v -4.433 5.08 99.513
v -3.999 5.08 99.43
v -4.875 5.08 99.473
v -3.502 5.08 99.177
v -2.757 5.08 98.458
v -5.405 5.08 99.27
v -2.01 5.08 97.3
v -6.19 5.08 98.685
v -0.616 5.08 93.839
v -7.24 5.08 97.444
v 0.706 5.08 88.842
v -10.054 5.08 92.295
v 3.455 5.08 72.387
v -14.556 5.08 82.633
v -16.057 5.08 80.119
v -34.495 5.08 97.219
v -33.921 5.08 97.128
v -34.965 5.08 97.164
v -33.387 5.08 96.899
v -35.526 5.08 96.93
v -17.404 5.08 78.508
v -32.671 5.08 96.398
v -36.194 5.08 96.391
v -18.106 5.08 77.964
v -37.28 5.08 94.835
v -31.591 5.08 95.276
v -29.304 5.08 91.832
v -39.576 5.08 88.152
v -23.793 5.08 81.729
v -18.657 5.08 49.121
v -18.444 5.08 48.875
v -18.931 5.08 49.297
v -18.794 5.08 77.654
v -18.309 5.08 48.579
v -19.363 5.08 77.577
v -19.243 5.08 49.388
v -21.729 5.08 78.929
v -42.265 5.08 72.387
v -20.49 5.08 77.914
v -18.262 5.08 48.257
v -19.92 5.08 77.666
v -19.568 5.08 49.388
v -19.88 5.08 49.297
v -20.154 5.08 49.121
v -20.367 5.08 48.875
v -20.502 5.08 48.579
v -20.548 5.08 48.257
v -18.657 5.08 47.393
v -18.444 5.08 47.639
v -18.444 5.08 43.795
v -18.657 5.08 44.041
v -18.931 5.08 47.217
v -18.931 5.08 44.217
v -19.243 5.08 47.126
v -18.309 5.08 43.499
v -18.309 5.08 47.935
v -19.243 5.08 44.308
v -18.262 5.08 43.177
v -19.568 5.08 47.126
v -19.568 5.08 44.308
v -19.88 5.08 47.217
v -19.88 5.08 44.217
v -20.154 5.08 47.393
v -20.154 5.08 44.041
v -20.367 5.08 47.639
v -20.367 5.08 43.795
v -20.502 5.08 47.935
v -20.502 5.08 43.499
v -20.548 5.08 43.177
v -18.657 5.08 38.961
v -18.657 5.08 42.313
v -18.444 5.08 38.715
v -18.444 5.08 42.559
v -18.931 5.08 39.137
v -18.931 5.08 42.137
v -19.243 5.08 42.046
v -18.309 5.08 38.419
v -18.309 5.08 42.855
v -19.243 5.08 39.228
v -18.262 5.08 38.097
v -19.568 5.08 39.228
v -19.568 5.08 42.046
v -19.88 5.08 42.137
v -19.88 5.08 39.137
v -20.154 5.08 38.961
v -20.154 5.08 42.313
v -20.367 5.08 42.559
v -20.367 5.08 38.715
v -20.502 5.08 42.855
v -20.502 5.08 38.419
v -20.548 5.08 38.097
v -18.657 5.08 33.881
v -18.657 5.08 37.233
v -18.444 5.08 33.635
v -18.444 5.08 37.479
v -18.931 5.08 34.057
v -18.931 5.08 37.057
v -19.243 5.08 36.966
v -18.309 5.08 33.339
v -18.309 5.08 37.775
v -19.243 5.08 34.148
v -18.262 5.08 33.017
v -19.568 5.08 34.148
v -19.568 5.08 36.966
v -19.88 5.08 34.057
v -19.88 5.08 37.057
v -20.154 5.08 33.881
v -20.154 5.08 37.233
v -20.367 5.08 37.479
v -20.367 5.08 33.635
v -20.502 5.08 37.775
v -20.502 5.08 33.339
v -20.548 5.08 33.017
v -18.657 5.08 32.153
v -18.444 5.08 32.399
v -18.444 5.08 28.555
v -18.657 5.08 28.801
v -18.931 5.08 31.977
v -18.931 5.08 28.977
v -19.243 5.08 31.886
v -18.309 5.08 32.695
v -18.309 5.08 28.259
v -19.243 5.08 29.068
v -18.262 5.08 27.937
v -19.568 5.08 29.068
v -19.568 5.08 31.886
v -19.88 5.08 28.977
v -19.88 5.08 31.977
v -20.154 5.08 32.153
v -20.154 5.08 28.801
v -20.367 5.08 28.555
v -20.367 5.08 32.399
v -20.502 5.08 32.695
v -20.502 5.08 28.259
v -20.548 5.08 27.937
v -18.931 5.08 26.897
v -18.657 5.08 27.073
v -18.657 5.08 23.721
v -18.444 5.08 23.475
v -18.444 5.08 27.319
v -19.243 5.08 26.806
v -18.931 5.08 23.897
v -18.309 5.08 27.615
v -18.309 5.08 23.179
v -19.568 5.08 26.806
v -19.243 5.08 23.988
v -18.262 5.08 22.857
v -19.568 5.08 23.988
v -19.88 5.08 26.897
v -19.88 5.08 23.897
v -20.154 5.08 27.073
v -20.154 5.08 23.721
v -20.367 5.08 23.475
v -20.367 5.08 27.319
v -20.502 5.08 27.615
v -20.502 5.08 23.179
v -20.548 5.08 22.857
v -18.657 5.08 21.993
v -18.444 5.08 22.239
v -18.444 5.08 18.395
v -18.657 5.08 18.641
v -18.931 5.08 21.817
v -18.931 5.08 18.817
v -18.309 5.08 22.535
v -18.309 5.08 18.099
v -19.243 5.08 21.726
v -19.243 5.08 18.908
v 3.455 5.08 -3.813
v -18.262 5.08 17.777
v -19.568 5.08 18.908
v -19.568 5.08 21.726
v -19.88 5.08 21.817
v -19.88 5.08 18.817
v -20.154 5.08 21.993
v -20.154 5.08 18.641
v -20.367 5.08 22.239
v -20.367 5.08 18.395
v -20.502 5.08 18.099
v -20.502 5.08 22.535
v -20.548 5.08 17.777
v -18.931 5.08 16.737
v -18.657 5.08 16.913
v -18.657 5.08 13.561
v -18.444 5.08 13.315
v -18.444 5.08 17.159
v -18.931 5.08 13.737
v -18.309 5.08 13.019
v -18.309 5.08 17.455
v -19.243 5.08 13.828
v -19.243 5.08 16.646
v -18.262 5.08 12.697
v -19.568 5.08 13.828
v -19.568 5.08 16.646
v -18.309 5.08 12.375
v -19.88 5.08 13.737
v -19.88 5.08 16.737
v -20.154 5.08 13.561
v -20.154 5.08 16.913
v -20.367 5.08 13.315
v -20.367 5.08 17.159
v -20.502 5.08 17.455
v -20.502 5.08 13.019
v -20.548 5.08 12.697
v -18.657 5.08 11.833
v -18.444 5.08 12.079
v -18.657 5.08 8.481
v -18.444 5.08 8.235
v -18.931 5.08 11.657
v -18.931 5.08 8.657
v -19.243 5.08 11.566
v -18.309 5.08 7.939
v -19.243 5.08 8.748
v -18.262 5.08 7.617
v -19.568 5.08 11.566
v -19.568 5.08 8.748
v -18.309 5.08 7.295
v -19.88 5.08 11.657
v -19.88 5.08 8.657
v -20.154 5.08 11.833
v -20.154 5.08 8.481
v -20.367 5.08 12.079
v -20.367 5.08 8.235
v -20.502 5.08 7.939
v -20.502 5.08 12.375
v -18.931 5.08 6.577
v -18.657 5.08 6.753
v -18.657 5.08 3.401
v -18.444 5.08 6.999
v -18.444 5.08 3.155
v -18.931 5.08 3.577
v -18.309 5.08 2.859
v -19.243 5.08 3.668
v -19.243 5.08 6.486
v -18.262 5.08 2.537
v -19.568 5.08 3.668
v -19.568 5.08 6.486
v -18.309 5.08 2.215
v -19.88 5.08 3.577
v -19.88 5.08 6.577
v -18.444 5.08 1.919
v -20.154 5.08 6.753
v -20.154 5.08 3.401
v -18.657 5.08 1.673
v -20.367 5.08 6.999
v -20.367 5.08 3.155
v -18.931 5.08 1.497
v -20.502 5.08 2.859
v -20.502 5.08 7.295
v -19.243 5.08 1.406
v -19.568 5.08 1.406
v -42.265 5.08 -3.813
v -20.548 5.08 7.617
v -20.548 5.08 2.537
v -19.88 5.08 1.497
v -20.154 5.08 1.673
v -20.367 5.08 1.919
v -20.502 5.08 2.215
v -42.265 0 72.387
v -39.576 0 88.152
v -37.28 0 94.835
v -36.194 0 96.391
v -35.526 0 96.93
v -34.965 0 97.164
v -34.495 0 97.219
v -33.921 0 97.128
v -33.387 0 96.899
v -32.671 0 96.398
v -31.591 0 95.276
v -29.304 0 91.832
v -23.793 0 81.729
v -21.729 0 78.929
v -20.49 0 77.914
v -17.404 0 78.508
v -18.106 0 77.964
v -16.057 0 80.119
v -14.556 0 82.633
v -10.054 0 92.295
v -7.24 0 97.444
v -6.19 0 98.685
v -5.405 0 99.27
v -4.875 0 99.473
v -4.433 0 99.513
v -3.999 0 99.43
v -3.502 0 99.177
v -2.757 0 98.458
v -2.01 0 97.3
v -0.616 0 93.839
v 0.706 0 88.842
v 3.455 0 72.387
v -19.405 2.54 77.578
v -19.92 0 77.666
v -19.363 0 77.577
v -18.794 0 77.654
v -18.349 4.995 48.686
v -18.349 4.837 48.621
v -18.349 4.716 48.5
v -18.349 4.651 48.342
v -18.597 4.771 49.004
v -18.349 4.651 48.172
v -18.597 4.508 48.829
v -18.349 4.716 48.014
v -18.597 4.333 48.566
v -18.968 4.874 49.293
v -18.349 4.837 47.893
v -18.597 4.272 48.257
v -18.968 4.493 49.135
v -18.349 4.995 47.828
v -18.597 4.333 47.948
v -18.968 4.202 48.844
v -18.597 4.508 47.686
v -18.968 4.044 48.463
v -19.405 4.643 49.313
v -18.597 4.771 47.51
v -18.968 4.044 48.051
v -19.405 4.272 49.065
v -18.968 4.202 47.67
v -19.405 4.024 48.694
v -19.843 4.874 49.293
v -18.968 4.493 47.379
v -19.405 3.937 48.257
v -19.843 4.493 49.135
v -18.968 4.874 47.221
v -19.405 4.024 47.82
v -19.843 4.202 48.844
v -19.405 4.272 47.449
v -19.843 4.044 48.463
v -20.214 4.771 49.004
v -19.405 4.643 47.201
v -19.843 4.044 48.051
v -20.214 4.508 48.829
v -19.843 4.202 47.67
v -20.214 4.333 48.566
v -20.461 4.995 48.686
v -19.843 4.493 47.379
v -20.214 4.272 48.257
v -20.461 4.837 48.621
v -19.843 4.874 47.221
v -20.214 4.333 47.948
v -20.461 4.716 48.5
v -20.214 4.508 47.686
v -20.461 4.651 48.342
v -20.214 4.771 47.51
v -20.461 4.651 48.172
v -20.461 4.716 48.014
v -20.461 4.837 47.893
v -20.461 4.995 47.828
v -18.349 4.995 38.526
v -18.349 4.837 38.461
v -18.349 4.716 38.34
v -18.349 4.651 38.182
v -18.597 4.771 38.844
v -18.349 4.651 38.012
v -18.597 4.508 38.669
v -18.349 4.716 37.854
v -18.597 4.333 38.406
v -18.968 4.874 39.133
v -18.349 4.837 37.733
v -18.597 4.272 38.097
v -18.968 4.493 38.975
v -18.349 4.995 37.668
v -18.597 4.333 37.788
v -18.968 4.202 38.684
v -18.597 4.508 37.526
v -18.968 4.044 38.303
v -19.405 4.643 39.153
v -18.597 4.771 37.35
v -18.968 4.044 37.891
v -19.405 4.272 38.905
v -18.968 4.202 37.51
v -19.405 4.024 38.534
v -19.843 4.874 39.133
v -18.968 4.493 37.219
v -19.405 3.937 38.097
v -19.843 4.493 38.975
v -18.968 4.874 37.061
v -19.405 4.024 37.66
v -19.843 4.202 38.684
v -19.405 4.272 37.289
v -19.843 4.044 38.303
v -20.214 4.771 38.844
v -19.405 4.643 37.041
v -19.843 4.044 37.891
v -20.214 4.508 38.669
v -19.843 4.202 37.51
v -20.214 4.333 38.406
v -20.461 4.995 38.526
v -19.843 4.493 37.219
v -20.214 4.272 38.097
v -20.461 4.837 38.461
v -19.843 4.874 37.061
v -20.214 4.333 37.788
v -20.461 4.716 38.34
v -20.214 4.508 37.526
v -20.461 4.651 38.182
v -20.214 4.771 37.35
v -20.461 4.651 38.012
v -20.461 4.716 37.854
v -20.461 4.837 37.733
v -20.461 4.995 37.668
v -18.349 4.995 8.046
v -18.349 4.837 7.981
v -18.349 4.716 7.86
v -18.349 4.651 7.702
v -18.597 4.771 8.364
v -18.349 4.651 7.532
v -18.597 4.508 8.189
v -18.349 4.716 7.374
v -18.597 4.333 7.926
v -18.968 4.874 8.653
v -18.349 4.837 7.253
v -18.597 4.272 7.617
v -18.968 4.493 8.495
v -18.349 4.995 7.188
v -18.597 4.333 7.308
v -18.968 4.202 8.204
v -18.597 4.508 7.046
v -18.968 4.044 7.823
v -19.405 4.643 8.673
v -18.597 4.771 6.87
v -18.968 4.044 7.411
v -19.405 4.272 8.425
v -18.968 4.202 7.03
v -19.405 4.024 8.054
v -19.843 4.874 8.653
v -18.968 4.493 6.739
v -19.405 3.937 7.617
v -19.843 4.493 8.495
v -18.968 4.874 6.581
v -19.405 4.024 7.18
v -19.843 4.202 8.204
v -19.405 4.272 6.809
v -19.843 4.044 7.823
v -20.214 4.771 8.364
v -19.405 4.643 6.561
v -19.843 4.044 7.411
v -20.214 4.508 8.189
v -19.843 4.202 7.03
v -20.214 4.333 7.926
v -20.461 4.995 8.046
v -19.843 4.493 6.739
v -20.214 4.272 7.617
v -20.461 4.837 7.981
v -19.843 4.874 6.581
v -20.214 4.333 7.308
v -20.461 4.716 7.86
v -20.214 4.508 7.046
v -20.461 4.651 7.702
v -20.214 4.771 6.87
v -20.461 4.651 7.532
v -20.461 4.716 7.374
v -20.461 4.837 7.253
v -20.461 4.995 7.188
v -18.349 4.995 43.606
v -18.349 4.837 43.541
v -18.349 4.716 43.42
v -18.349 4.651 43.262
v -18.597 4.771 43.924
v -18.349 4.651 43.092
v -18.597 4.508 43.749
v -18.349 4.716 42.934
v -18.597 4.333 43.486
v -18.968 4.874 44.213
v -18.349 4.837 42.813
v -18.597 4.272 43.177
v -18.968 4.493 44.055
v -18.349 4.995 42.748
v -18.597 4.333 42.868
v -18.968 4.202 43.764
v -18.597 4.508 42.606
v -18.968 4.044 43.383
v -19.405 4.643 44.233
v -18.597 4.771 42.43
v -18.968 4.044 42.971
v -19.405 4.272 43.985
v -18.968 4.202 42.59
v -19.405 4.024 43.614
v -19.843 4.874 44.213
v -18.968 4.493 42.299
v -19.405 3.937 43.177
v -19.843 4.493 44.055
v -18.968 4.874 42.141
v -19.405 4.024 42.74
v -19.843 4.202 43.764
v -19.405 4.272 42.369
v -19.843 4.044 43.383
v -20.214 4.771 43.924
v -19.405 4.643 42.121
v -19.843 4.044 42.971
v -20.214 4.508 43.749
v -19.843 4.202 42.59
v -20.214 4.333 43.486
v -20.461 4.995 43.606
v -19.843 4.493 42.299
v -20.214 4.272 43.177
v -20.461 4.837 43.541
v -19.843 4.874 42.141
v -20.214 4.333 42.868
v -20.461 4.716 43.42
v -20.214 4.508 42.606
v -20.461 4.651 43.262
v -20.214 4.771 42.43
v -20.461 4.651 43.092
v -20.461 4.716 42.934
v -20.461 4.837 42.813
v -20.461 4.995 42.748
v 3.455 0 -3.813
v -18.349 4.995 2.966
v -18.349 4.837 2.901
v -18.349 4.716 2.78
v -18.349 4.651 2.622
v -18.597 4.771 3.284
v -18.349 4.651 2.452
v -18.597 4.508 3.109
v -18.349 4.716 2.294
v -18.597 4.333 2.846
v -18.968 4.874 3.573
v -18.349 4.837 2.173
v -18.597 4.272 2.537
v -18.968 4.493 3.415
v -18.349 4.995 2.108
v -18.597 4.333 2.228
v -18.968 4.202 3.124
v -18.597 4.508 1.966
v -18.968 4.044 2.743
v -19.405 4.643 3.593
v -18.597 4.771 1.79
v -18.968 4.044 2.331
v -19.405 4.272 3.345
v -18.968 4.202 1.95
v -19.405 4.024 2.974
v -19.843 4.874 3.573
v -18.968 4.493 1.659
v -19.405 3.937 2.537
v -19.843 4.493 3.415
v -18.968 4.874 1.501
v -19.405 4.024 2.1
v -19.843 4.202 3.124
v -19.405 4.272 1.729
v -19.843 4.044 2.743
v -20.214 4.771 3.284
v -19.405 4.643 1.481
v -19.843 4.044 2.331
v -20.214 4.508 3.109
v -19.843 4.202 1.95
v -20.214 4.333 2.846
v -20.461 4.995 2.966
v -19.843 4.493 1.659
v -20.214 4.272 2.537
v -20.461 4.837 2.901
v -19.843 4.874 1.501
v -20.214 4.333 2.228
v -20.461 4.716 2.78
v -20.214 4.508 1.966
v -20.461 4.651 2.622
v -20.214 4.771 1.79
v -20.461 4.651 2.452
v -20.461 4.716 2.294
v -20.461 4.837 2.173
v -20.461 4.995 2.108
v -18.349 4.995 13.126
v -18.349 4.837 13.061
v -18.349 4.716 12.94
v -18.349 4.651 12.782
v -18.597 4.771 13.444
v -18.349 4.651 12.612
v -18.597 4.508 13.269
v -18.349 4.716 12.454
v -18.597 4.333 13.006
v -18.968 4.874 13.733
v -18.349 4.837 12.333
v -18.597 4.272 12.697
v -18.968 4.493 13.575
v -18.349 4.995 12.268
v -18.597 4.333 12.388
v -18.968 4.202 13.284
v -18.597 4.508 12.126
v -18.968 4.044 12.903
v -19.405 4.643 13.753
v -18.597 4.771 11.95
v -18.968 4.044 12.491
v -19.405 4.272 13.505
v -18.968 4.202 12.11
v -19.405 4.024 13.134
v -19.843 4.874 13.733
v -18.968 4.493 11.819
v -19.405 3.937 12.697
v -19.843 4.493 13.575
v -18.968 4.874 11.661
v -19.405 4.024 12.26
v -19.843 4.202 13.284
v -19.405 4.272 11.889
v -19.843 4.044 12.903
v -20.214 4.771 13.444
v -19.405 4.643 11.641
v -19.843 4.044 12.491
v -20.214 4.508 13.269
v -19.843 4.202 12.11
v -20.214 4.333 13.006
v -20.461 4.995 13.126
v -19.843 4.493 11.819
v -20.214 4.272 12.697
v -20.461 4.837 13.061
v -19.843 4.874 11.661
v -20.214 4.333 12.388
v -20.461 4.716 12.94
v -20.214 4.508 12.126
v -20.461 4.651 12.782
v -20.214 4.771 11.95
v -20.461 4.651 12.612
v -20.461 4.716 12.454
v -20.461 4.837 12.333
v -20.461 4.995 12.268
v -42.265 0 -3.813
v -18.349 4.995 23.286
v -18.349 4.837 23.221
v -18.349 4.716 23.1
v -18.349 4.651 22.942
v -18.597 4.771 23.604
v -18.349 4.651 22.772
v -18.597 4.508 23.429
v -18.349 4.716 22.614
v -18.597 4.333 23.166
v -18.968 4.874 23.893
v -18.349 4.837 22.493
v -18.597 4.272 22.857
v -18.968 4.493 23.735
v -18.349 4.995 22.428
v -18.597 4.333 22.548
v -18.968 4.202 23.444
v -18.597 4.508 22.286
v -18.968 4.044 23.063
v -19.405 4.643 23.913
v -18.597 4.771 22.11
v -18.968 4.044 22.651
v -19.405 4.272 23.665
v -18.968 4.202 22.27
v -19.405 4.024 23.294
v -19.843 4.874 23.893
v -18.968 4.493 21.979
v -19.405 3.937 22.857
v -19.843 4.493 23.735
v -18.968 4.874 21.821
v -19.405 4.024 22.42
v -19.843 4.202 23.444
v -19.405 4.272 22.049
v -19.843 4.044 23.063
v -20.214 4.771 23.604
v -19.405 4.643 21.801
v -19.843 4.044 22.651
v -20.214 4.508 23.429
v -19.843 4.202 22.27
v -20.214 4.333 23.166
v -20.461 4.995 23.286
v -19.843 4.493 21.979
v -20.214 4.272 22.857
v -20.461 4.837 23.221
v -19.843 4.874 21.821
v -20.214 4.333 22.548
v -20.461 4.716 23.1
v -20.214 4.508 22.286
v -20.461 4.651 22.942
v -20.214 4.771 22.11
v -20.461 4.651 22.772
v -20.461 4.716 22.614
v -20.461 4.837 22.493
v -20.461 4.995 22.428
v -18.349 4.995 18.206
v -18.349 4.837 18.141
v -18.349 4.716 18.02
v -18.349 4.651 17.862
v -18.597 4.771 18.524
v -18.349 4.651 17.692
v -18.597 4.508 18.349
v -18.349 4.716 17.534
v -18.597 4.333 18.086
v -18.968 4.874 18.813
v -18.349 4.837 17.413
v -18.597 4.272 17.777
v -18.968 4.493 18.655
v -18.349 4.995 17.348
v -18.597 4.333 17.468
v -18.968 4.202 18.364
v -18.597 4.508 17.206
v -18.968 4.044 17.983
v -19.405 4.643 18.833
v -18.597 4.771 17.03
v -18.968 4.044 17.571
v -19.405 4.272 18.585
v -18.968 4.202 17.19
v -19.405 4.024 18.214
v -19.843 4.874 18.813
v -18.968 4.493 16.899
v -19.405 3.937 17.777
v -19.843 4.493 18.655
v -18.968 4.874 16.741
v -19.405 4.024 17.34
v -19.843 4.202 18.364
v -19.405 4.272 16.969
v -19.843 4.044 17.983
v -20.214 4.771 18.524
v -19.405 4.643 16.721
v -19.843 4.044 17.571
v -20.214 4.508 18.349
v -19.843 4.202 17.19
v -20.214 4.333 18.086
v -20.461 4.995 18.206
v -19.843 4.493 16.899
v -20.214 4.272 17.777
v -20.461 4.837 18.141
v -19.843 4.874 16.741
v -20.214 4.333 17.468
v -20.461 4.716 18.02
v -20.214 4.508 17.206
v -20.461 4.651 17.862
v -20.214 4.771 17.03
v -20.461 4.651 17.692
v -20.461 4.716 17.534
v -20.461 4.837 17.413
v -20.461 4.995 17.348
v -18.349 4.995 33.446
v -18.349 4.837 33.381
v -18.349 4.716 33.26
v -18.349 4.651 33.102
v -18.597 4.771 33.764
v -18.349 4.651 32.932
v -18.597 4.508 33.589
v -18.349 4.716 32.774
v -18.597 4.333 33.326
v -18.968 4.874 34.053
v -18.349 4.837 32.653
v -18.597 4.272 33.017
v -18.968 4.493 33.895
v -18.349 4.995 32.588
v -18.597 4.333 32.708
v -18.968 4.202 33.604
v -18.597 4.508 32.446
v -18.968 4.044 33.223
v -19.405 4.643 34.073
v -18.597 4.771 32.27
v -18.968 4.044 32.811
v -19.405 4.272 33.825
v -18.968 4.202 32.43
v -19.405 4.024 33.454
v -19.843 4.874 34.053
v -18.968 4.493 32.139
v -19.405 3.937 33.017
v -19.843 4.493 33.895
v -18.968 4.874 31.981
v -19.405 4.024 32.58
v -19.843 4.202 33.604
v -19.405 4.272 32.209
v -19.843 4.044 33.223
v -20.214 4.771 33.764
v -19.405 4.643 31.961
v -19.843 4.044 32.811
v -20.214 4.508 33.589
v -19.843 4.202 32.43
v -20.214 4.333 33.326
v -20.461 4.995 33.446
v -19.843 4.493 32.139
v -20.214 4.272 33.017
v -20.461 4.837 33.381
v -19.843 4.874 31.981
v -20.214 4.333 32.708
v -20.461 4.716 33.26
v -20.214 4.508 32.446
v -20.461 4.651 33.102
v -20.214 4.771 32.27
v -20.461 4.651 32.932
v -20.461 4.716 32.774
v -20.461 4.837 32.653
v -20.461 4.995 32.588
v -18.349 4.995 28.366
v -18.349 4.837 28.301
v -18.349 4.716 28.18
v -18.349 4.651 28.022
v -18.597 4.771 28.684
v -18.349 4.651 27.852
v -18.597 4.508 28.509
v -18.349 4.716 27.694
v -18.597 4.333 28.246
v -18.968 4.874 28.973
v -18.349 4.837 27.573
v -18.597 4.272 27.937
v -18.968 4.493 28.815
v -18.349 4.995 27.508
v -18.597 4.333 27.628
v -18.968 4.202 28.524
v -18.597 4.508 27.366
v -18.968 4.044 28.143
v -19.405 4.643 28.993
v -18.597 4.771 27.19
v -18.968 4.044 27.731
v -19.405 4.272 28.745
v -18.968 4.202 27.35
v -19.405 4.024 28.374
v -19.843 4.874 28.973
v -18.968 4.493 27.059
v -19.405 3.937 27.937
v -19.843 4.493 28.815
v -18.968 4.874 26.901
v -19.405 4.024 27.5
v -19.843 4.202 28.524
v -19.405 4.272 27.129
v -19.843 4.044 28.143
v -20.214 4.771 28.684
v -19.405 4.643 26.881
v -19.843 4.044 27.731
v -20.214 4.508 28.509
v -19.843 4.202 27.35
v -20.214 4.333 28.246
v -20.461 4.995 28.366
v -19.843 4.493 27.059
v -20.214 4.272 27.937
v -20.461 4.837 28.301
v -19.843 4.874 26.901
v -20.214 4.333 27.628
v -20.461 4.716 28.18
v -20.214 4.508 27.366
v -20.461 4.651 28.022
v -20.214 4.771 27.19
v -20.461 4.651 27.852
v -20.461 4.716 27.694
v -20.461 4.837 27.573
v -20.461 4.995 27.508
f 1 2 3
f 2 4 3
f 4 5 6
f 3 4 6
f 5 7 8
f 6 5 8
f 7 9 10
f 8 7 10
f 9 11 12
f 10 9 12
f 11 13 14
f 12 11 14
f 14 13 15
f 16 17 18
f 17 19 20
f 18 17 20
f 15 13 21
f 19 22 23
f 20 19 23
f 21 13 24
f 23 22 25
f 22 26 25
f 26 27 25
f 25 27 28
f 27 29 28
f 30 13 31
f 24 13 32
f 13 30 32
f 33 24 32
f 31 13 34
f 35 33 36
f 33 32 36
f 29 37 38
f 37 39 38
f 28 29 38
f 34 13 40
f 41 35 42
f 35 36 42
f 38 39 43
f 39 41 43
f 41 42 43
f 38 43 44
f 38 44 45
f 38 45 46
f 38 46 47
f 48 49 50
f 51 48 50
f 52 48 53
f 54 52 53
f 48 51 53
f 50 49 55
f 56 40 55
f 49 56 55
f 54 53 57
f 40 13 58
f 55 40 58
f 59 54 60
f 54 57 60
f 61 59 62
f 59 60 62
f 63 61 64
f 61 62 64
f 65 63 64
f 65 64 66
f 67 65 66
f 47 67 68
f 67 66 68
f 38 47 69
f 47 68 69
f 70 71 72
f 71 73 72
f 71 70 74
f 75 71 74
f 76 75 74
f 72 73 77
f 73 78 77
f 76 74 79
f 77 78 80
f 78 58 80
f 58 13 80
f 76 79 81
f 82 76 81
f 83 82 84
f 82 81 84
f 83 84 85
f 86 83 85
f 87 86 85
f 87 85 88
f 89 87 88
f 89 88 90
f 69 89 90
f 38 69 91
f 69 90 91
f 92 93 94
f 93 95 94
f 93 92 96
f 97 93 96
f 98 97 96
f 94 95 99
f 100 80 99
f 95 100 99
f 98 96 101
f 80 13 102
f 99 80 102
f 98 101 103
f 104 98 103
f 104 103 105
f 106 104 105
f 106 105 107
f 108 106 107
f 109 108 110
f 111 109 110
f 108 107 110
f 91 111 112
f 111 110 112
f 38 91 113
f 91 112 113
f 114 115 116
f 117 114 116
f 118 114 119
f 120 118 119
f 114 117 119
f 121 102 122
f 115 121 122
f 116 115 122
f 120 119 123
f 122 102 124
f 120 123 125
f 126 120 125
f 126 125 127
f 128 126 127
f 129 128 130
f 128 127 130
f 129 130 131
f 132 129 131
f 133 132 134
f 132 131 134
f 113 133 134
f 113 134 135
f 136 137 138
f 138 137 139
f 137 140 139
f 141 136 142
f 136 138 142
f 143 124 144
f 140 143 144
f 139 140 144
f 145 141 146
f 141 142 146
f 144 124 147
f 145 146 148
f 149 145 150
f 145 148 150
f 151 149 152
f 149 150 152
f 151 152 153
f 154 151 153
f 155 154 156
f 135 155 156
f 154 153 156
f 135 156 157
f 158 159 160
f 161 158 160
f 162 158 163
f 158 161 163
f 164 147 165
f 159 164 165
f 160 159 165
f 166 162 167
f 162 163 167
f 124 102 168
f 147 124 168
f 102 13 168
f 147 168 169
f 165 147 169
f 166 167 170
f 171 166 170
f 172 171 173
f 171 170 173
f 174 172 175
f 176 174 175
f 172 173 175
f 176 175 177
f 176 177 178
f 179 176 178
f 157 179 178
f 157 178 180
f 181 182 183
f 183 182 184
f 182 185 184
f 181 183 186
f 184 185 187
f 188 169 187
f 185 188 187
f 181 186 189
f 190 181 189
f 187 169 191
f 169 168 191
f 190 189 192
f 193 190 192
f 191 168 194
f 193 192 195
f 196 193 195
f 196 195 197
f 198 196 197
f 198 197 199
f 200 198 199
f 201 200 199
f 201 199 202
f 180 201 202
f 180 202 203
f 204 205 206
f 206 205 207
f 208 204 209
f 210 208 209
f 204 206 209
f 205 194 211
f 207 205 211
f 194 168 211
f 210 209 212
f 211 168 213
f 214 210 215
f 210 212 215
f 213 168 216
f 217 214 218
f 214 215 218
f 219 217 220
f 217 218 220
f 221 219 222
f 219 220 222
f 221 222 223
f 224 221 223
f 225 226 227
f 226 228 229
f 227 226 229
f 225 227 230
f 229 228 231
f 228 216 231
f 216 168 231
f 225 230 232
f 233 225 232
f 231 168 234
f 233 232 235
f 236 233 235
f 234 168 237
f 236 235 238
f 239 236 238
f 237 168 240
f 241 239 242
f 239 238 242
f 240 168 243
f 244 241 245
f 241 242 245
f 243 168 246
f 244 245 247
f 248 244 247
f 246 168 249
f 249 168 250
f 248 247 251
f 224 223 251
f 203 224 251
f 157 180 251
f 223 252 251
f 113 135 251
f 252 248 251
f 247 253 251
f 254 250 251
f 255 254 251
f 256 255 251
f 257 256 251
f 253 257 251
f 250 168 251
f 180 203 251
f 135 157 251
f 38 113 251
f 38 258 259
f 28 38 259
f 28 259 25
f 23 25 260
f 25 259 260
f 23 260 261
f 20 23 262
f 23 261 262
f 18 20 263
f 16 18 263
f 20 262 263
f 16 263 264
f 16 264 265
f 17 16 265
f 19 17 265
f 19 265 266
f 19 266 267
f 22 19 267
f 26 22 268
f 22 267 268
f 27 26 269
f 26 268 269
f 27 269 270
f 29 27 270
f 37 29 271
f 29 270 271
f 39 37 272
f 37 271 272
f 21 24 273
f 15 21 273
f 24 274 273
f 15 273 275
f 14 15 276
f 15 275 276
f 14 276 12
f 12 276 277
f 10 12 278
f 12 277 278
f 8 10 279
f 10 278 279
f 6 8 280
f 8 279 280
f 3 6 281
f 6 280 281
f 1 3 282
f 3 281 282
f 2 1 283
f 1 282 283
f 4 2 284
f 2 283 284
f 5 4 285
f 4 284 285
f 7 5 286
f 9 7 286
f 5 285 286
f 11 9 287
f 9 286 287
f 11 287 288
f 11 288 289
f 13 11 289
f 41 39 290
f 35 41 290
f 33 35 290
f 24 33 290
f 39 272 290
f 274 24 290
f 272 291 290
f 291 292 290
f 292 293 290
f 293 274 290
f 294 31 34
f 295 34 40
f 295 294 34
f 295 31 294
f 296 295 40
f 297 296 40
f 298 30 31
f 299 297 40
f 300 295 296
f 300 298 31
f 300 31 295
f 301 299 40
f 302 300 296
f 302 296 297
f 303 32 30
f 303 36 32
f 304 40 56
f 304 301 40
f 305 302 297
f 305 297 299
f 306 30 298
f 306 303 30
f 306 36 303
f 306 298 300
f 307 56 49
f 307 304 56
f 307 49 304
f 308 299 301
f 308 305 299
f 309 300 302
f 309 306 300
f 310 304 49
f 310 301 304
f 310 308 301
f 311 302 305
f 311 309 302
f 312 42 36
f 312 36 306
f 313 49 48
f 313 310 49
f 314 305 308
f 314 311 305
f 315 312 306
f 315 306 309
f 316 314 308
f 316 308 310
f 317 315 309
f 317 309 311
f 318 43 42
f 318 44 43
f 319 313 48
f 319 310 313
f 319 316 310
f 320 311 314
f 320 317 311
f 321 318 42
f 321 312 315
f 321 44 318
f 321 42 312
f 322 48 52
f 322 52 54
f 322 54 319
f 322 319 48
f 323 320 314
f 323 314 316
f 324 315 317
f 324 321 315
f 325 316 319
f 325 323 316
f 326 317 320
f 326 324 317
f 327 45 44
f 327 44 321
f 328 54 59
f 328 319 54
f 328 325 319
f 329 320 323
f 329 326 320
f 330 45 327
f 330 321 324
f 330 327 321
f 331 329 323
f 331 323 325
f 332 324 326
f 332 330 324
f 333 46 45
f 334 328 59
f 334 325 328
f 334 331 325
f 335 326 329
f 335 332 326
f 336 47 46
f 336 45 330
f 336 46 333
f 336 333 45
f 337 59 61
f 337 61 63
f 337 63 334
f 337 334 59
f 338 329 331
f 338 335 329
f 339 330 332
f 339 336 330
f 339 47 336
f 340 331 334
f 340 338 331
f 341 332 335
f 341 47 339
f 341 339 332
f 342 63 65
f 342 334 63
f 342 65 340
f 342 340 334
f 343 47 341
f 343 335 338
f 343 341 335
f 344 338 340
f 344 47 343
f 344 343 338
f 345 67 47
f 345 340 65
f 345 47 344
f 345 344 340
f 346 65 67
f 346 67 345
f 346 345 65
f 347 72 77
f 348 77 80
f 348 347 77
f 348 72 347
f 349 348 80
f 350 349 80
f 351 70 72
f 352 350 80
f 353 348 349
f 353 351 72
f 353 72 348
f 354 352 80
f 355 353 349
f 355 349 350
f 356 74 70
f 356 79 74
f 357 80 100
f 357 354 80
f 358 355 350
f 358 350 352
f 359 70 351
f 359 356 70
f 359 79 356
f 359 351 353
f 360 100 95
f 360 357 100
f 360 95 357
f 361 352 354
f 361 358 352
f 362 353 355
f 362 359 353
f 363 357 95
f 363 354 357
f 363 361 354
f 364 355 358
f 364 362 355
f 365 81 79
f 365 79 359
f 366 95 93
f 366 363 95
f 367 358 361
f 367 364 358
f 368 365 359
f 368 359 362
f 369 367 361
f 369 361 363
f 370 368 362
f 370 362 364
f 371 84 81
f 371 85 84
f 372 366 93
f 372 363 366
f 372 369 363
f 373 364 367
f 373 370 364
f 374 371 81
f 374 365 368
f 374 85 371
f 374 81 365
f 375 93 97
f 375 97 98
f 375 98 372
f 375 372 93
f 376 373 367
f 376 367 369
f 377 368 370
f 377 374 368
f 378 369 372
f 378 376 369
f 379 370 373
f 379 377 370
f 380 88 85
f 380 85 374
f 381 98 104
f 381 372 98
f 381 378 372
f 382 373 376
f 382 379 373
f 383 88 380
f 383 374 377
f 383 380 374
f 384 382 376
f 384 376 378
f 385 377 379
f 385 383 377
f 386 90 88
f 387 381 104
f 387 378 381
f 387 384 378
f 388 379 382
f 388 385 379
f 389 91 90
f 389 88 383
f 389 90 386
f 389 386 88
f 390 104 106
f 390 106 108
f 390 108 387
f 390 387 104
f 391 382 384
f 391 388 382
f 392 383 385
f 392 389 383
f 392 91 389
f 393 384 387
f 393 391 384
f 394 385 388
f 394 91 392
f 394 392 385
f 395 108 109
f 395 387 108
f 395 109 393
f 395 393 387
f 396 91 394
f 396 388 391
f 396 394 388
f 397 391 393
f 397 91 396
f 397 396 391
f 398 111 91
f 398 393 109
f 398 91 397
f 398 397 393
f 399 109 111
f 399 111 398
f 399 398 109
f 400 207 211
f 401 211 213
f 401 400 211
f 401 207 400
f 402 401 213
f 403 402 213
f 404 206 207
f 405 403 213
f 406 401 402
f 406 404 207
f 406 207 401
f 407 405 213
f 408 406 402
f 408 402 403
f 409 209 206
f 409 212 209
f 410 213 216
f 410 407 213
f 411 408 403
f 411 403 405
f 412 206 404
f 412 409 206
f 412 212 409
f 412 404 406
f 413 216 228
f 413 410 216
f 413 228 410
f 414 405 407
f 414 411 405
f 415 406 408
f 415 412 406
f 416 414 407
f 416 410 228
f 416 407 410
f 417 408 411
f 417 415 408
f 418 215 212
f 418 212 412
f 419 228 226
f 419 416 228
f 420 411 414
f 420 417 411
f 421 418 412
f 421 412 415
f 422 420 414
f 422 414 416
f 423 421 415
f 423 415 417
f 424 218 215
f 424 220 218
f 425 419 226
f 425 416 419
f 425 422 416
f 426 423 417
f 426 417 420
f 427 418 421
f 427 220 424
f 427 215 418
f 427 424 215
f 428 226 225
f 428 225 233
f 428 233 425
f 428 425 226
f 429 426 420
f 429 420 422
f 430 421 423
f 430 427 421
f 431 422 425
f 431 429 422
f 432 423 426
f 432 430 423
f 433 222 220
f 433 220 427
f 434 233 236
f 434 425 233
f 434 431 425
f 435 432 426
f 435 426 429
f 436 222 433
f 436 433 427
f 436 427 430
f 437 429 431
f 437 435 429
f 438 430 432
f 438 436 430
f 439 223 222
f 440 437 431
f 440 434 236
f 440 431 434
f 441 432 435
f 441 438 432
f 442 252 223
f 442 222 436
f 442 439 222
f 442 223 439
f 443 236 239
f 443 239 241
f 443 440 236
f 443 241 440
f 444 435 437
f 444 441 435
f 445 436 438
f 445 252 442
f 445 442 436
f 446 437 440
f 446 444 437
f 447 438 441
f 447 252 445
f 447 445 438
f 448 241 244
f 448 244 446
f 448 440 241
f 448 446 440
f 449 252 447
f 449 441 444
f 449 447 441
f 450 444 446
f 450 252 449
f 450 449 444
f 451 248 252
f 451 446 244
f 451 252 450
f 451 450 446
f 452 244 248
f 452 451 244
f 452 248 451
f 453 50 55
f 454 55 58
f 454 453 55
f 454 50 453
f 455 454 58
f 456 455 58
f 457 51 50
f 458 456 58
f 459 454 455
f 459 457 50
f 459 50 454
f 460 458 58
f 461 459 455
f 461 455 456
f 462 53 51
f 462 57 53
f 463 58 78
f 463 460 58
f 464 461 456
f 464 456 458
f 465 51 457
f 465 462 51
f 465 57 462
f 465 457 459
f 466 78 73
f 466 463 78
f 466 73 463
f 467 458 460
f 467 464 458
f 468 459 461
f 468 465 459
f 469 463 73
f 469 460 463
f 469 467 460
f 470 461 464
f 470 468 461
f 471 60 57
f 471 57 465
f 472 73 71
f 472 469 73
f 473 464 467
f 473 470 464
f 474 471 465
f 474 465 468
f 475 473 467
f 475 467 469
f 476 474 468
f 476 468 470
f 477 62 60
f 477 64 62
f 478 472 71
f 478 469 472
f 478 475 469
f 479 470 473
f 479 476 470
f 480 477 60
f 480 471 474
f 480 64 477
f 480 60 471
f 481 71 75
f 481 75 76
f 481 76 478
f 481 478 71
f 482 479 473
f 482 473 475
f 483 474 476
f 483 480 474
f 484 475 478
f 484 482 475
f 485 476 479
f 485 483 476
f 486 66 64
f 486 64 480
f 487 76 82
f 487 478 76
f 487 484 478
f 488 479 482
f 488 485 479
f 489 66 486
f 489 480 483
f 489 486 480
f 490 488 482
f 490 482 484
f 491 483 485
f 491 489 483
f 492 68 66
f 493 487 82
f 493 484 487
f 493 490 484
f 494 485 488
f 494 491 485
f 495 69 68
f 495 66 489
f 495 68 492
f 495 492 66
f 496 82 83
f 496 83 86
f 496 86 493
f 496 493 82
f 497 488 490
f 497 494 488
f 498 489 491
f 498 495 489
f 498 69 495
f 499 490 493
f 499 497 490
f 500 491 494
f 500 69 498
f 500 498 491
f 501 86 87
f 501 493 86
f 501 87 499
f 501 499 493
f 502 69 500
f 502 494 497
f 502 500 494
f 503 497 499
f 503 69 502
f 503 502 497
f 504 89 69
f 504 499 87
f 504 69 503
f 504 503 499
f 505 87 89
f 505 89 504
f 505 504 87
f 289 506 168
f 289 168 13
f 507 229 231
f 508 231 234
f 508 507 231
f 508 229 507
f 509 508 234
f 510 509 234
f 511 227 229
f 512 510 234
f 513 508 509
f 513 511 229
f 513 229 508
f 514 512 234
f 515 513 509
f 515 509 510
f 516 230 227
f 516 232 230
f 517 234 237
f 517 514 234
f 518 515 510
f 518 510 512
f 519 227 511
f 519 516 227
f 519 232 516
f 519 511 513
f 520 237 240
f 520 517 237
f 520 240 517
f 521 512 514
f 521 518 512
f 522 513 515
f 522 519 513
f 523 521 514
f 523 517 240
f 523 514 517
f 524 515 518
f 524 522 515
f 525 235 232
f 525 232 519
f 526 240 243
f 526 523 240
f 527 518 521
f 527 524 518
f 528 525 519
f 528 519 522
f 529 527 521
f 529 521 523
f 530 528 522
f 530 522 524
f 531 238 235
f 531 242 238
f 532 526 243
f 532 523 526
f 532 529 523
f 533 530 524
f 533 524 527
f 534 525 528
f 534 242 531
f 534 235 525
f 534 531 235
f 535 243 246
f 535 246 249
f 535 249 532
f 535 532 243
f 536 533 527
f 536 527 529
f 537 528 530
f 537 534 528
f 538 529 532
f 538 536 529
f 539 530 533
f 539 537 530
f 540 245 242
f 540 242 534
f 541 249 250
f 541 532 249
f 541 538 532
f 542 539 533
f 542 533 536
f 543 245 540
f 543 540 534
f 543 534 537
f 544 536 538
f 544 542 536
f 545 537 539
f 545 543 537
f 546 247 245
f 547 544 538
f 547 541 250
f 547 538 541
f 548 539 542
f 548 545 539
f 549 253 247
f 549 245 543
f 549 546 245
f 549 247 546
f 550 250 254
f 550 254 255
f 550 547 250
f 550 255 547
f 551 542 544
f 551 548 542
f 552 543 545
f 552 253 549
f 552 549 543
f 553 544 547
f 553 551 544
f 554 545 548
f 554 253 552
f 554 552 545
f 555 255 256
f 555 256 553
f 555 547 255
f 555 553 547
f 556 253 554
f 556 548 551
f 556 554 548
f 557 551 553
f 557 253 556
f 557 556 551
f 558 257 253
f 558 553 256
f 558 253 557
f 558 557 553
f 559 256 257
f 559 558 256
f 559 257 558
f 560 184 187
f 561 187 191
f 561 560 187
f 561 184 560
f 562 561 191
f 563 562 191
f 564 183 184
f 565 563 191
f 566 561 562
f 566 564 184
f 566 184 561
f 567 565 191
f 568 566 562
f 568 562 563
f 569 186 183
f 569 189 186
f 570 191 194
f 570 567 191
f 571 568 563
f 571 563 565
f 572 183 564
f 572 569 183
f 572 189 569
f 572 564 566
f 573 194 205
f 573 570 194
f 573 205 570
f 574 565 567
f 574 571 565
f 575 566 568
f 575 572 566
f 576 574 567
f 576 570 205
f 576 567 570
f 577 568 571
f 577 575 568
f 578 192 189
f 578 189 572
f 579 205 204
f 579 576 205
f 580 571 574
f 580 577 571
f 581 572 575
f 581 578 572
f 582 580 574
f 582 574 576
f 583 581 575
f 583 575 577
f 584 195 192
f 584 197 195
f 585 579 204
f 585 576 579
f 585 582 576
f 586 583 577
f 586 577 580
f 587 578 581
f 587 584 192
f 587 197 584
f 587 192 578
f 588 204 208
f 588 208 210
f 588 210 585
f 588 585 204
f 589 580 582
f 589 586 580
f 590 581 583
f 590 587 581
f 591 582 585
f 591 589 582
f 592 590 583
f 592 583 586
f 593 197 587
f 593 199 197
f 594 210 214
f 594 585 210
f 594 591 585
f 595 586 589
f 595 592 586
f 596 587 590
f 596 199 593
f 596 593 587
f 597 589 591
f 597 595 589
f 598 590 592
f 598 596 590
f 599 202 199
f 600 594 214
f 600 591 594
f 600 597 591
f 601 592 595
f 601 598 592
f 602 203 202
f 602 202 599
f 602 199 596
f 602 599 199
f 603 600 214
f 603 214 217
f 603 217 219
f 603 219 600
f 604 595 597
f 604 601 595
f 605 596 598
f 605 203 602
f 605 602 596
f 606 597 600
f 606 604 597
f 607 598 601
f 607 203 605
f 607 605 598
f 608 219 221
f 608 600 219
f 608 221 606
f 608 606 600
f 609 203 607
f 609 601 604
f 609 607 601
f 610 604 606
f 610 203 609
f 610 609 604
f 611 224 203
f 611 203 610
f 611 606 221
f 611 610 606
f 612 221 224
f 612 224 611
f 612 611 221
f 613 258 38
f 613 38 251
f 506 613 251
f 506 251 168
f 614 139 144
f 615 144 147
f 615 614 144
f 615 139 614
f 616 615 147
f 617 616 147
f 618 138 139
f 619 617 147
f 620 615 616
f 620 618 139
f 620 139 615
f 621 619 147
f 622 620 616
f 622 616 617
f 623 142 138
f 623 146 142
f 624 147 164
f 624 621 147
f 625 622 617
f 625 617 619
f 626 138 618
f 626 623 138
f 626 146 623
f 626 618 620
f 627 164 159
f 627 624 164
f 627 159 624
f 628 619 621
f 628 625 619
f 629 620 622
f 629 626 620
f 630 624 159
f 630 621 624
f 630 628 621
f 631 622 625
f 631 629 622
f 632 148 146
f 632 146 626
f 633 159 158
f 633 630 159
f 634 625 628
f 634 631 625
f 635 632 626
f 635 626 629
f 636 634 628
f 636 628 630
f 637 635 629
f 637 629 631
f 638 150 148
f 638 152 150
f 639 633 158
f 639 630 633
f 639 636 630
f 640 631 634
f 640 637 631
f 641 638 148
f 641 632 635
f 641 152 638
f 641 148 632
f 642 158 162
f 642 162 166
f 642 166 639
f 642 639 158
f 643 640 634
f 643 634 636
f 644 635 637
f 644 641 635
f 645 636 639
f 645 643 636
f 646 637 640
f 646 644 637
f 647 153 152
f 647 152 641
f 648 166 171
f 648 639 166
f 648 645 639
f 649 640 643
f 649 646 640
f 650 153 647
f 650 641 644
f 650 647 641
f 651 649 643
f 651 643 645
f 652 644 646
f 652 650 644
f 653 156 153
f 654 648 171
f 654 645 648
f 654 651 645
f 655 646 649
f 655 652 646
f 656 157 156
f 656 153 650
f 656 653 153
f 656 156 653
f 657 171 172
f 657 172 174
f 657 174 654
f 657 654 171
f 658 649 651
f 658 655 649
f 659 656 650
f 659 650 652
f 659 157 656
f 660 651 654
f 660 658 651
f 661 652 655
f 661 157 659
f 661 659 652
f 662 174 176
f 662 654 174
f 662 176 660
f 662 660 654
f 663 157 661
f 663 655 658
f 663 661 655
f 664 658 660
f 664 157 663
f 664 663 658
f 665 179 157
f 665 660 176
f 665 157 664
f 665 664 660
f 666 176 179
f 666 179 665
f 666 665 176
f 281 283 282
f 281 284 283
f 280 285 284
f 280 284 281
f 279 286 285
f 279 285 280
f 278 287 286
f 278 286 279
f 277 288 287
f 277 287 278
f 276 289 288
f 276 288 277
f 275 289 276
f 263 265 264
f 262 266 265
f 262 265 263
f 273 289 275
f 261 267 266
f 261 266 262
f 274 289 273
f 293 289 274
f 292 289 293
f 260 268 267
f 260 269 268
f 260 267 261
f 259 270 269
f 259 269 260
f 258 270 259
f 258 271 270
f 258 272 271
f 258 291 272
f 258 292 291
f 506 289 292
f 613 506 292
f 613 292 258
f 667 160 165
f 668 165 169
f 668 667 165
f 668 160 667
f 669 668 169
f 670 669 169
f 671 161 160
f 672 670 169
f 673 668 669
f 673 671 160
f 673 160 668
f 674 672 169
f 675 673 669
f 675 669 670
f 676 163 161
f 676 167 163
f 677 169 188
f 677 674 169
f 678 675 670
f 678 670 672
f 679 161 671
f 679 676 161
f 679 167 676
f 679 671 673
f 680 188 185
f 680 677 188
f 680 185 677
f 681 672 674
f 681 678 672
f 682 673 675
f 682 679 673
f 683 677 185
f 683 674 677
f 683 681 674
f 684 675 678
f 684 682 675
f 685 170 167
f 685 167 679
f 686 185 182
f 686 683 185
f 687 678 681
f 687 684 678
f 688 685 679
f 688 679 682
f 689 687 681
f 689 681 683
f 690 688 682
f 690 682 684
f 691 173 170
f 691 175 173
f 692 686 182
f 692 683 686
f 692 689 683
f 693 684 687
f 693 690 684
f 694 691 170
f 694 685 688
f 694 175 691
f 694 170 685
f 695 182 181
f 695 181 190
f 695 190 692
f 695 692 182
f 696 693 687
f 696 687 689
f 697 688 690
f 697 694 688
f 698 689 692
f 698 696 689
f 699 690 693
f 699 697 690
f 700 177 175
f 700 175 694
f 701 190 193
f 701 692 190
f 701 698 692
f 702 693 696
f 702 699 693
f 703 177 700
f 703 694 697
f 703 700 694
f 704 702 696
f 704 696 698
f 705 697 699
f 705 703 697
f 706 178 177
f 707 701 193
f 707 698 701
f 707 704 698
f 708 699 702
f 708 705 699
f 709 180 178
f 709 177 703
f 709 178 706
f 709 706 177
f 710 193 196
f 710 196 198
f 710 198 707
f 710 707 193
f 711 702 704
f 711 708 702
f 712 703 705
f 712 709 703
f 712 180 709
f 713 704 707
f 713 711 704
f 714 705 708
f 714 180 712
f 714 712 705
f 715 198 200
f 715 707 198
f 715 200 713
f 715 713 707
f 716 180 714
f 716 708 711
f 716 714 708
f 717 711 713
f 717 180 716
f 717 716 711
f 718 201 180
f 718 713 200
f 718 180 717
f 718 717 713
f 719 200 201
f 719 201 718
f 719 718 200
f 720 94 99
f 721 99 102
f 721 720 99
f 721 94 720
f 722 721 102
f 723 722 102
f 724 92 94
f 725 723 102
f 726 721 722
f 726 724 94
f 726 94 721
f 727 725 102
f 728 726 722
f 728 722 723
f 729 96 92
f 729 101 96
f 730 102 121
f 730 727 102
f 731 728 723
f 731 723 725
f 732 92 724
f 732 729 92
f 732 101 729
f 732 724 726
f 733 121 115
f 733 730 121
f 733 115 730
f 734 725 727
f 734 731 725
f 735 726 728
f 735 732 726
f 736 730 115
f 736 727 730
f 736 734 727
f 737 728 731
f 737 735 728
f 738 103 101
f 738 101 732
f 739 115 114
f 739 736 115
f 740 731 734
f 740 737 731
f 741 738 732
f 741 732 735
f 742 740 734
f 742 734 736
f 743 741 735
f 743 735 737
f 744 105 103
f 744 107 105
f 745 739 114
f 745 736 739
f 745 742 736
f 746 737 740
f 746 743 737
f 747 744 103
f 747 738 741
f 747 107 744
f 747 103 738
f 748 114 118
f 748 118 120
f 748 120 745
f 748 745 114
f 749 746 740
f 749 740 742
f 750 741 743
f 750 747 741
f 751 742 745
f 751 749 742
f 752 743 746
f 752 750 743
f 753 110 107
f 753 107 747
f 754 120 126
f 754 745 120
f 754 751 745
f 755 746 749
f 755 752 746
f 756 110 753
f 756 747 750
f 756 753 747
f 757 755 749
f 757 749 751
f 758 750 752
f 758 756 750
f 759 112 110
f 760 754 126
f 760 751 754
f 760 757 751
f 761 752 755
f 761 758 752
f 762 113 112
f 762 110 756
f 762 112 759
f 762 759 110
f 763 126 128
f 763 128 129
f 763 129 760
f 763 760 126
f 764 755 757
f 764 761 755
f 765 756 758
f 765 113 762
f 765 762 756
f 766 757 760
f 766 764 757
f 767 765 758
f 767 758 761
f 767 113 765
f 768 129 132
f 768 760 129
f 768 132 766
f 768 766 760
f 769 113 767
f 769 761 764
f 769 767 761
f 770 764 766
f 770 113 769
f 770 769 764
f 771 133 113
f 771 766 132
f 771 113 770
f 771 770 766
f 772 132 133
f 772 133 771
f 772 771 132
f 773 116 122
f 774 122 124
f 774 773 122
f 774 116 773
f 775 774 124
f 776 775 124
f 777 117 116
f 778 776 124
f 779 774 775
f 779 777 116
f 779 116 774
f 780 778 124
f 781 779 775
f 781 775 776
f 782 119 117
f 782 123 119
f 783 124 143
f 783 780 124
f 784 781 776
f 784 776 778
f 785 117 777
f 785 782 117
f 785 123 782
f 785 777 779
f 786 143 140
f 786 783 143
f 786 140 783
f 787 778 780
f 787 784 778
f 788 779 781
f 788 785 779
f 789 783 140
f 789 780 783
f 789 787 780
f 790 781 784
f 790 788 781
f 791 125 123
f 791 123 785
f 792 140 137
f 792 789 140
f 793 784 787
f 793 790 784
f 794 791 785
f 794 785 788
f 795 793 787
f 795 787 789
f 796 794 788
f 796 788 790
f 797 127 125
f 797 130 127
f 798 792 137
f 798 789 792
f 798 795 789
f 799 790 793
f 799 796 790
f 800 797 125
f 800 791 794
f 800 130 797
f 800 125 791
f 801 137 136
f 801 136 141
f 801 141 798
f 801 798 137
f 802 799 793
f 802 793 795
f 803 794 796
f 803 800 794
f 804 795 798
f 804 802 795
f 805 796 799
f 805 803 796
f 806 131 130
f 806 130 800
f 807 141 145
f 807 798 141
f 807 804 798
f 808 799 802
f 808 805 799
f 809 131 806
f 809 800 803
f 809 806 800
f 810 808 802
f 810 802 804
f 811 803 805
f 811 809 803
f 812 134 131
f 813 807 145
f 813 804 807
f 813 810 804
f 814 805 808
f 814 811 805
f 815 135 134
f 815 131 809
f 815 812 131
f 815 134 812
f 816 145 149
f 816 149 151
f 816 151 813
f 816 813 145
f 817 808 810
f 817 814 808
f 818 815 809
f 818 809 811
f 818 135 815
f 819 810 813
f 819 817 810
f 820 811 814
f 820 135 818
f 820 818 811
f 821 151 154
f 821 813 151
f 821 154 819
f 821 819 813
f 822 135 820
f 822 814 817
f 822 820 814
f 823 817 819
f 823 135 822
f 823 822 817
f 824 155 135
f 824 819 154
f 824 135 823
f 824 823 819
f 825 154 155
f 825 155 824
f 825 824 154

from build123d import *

# Parameters (mm, degrees)
BOSS_EXTRUDE1_DEPTH = 5.08
LPATTERN1_COUNT     = 10
LPATTERN1_PITCH     = 5.08


with BuildPart() as part:
    # Sketch1 → Boss-Extrude1 (new body)
    with BuildSketch(Plane(origin=(0, 0, 0), x_dir=(1, 0, 0), z_dir=(0, 1, 0))):
        with BuildLine():
            Line((-42.265392491, 3.812969283), (3.454607509, 3.812969283))
            Line((3.454607509, 3.812969283), (3.454607509, -72.387030717))
            add(Edge.make_bspline(
                [(-42.265392491, -72.387030717), (-35.611628709, -124.895548509), (-17.863111268, -27.582520746), (-4.18793222, -130.397350191), (3.454607509, -72.387030717)],
                knots=[0, 0, 0, 0, 0.483362267, 1, 1, 1, 1], degree=3))
            Line((-42.265392491, -72.387030717), (-42.265392491, 3.812969283))
        make_face()
    extrude(amount=BOSS_EXTRUDE1_DEPTH)

    # Sketch2 → Cut-Revolve1 (revolve, cut)
    with BuildSketch(Plane(origin=(0, 5.08, 0), x_dir=(1, 0, 0), z_dir=(0, 1, 0))):
        with BuildLine():
            Line((-20.548392491, -2.537030717), (-18.262392491, -2.537030717))
            ThreePointArc((-18.262392491, -2.537030717), (-19.405392491, -1.394030717), (-20.548392491, -2.537030717))
        make_face()
    cut_revolve1 = revolve(axis=Axis((-20.548392491, 5.08, 2.537030717), (1, 0, 0)), mode=Mode.SUBTRACT)

    # LPattern1: Cut-Revolve1 ×10
    with Locations(*[(0, 0, i * LPATTERN1_PITCH) for i in range(1, LPATTERN1_COUNT)]):
        add(cut_revolve1, mode=Mode.SUBTRACT)


solid = part.part
